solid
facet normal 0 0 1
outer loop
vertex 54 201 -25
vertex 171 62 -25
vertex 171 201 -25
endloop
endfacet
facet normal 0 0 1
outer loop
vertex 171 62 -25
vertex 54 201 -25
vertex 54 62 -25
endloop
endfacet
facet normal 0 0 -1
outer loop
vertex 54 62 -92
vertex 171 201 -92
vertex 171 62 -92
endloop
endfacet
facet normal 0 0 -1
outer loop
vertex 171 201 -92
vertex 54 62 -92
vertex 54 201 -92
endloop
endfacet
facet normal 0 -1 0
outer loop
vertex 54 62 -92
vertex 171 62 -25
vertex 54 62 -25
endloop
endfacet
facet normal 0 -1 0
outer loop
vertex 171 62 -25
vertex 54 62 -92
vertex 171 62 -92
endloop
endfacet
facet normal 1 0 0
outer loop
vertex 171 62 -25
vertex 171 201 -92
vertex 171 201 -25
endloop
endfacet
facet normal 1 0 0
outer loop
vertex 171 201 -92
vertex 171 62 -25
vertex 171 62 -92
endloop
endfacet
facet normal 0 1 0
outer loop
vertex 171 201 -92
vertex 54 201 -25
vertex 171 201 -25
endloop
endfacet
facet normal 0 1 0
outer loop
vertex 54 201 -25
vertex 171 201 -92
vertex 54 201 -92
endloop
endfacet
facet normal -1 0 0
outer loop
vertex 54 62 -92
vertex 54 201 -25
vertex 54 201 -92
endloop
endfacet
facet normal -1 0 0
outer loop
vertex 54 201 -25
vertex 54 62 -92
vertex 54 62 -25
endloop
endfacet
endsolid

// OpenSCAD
union(){
    cube(size=[0, 0, 0]);
    translate(v=[112.5, 131.5, -58.5]){
        translate(v=[-58.5, -69.5, -33.5]){
            cube(size=[117.0, 139.0, 67.0]);
        };
    };
};
